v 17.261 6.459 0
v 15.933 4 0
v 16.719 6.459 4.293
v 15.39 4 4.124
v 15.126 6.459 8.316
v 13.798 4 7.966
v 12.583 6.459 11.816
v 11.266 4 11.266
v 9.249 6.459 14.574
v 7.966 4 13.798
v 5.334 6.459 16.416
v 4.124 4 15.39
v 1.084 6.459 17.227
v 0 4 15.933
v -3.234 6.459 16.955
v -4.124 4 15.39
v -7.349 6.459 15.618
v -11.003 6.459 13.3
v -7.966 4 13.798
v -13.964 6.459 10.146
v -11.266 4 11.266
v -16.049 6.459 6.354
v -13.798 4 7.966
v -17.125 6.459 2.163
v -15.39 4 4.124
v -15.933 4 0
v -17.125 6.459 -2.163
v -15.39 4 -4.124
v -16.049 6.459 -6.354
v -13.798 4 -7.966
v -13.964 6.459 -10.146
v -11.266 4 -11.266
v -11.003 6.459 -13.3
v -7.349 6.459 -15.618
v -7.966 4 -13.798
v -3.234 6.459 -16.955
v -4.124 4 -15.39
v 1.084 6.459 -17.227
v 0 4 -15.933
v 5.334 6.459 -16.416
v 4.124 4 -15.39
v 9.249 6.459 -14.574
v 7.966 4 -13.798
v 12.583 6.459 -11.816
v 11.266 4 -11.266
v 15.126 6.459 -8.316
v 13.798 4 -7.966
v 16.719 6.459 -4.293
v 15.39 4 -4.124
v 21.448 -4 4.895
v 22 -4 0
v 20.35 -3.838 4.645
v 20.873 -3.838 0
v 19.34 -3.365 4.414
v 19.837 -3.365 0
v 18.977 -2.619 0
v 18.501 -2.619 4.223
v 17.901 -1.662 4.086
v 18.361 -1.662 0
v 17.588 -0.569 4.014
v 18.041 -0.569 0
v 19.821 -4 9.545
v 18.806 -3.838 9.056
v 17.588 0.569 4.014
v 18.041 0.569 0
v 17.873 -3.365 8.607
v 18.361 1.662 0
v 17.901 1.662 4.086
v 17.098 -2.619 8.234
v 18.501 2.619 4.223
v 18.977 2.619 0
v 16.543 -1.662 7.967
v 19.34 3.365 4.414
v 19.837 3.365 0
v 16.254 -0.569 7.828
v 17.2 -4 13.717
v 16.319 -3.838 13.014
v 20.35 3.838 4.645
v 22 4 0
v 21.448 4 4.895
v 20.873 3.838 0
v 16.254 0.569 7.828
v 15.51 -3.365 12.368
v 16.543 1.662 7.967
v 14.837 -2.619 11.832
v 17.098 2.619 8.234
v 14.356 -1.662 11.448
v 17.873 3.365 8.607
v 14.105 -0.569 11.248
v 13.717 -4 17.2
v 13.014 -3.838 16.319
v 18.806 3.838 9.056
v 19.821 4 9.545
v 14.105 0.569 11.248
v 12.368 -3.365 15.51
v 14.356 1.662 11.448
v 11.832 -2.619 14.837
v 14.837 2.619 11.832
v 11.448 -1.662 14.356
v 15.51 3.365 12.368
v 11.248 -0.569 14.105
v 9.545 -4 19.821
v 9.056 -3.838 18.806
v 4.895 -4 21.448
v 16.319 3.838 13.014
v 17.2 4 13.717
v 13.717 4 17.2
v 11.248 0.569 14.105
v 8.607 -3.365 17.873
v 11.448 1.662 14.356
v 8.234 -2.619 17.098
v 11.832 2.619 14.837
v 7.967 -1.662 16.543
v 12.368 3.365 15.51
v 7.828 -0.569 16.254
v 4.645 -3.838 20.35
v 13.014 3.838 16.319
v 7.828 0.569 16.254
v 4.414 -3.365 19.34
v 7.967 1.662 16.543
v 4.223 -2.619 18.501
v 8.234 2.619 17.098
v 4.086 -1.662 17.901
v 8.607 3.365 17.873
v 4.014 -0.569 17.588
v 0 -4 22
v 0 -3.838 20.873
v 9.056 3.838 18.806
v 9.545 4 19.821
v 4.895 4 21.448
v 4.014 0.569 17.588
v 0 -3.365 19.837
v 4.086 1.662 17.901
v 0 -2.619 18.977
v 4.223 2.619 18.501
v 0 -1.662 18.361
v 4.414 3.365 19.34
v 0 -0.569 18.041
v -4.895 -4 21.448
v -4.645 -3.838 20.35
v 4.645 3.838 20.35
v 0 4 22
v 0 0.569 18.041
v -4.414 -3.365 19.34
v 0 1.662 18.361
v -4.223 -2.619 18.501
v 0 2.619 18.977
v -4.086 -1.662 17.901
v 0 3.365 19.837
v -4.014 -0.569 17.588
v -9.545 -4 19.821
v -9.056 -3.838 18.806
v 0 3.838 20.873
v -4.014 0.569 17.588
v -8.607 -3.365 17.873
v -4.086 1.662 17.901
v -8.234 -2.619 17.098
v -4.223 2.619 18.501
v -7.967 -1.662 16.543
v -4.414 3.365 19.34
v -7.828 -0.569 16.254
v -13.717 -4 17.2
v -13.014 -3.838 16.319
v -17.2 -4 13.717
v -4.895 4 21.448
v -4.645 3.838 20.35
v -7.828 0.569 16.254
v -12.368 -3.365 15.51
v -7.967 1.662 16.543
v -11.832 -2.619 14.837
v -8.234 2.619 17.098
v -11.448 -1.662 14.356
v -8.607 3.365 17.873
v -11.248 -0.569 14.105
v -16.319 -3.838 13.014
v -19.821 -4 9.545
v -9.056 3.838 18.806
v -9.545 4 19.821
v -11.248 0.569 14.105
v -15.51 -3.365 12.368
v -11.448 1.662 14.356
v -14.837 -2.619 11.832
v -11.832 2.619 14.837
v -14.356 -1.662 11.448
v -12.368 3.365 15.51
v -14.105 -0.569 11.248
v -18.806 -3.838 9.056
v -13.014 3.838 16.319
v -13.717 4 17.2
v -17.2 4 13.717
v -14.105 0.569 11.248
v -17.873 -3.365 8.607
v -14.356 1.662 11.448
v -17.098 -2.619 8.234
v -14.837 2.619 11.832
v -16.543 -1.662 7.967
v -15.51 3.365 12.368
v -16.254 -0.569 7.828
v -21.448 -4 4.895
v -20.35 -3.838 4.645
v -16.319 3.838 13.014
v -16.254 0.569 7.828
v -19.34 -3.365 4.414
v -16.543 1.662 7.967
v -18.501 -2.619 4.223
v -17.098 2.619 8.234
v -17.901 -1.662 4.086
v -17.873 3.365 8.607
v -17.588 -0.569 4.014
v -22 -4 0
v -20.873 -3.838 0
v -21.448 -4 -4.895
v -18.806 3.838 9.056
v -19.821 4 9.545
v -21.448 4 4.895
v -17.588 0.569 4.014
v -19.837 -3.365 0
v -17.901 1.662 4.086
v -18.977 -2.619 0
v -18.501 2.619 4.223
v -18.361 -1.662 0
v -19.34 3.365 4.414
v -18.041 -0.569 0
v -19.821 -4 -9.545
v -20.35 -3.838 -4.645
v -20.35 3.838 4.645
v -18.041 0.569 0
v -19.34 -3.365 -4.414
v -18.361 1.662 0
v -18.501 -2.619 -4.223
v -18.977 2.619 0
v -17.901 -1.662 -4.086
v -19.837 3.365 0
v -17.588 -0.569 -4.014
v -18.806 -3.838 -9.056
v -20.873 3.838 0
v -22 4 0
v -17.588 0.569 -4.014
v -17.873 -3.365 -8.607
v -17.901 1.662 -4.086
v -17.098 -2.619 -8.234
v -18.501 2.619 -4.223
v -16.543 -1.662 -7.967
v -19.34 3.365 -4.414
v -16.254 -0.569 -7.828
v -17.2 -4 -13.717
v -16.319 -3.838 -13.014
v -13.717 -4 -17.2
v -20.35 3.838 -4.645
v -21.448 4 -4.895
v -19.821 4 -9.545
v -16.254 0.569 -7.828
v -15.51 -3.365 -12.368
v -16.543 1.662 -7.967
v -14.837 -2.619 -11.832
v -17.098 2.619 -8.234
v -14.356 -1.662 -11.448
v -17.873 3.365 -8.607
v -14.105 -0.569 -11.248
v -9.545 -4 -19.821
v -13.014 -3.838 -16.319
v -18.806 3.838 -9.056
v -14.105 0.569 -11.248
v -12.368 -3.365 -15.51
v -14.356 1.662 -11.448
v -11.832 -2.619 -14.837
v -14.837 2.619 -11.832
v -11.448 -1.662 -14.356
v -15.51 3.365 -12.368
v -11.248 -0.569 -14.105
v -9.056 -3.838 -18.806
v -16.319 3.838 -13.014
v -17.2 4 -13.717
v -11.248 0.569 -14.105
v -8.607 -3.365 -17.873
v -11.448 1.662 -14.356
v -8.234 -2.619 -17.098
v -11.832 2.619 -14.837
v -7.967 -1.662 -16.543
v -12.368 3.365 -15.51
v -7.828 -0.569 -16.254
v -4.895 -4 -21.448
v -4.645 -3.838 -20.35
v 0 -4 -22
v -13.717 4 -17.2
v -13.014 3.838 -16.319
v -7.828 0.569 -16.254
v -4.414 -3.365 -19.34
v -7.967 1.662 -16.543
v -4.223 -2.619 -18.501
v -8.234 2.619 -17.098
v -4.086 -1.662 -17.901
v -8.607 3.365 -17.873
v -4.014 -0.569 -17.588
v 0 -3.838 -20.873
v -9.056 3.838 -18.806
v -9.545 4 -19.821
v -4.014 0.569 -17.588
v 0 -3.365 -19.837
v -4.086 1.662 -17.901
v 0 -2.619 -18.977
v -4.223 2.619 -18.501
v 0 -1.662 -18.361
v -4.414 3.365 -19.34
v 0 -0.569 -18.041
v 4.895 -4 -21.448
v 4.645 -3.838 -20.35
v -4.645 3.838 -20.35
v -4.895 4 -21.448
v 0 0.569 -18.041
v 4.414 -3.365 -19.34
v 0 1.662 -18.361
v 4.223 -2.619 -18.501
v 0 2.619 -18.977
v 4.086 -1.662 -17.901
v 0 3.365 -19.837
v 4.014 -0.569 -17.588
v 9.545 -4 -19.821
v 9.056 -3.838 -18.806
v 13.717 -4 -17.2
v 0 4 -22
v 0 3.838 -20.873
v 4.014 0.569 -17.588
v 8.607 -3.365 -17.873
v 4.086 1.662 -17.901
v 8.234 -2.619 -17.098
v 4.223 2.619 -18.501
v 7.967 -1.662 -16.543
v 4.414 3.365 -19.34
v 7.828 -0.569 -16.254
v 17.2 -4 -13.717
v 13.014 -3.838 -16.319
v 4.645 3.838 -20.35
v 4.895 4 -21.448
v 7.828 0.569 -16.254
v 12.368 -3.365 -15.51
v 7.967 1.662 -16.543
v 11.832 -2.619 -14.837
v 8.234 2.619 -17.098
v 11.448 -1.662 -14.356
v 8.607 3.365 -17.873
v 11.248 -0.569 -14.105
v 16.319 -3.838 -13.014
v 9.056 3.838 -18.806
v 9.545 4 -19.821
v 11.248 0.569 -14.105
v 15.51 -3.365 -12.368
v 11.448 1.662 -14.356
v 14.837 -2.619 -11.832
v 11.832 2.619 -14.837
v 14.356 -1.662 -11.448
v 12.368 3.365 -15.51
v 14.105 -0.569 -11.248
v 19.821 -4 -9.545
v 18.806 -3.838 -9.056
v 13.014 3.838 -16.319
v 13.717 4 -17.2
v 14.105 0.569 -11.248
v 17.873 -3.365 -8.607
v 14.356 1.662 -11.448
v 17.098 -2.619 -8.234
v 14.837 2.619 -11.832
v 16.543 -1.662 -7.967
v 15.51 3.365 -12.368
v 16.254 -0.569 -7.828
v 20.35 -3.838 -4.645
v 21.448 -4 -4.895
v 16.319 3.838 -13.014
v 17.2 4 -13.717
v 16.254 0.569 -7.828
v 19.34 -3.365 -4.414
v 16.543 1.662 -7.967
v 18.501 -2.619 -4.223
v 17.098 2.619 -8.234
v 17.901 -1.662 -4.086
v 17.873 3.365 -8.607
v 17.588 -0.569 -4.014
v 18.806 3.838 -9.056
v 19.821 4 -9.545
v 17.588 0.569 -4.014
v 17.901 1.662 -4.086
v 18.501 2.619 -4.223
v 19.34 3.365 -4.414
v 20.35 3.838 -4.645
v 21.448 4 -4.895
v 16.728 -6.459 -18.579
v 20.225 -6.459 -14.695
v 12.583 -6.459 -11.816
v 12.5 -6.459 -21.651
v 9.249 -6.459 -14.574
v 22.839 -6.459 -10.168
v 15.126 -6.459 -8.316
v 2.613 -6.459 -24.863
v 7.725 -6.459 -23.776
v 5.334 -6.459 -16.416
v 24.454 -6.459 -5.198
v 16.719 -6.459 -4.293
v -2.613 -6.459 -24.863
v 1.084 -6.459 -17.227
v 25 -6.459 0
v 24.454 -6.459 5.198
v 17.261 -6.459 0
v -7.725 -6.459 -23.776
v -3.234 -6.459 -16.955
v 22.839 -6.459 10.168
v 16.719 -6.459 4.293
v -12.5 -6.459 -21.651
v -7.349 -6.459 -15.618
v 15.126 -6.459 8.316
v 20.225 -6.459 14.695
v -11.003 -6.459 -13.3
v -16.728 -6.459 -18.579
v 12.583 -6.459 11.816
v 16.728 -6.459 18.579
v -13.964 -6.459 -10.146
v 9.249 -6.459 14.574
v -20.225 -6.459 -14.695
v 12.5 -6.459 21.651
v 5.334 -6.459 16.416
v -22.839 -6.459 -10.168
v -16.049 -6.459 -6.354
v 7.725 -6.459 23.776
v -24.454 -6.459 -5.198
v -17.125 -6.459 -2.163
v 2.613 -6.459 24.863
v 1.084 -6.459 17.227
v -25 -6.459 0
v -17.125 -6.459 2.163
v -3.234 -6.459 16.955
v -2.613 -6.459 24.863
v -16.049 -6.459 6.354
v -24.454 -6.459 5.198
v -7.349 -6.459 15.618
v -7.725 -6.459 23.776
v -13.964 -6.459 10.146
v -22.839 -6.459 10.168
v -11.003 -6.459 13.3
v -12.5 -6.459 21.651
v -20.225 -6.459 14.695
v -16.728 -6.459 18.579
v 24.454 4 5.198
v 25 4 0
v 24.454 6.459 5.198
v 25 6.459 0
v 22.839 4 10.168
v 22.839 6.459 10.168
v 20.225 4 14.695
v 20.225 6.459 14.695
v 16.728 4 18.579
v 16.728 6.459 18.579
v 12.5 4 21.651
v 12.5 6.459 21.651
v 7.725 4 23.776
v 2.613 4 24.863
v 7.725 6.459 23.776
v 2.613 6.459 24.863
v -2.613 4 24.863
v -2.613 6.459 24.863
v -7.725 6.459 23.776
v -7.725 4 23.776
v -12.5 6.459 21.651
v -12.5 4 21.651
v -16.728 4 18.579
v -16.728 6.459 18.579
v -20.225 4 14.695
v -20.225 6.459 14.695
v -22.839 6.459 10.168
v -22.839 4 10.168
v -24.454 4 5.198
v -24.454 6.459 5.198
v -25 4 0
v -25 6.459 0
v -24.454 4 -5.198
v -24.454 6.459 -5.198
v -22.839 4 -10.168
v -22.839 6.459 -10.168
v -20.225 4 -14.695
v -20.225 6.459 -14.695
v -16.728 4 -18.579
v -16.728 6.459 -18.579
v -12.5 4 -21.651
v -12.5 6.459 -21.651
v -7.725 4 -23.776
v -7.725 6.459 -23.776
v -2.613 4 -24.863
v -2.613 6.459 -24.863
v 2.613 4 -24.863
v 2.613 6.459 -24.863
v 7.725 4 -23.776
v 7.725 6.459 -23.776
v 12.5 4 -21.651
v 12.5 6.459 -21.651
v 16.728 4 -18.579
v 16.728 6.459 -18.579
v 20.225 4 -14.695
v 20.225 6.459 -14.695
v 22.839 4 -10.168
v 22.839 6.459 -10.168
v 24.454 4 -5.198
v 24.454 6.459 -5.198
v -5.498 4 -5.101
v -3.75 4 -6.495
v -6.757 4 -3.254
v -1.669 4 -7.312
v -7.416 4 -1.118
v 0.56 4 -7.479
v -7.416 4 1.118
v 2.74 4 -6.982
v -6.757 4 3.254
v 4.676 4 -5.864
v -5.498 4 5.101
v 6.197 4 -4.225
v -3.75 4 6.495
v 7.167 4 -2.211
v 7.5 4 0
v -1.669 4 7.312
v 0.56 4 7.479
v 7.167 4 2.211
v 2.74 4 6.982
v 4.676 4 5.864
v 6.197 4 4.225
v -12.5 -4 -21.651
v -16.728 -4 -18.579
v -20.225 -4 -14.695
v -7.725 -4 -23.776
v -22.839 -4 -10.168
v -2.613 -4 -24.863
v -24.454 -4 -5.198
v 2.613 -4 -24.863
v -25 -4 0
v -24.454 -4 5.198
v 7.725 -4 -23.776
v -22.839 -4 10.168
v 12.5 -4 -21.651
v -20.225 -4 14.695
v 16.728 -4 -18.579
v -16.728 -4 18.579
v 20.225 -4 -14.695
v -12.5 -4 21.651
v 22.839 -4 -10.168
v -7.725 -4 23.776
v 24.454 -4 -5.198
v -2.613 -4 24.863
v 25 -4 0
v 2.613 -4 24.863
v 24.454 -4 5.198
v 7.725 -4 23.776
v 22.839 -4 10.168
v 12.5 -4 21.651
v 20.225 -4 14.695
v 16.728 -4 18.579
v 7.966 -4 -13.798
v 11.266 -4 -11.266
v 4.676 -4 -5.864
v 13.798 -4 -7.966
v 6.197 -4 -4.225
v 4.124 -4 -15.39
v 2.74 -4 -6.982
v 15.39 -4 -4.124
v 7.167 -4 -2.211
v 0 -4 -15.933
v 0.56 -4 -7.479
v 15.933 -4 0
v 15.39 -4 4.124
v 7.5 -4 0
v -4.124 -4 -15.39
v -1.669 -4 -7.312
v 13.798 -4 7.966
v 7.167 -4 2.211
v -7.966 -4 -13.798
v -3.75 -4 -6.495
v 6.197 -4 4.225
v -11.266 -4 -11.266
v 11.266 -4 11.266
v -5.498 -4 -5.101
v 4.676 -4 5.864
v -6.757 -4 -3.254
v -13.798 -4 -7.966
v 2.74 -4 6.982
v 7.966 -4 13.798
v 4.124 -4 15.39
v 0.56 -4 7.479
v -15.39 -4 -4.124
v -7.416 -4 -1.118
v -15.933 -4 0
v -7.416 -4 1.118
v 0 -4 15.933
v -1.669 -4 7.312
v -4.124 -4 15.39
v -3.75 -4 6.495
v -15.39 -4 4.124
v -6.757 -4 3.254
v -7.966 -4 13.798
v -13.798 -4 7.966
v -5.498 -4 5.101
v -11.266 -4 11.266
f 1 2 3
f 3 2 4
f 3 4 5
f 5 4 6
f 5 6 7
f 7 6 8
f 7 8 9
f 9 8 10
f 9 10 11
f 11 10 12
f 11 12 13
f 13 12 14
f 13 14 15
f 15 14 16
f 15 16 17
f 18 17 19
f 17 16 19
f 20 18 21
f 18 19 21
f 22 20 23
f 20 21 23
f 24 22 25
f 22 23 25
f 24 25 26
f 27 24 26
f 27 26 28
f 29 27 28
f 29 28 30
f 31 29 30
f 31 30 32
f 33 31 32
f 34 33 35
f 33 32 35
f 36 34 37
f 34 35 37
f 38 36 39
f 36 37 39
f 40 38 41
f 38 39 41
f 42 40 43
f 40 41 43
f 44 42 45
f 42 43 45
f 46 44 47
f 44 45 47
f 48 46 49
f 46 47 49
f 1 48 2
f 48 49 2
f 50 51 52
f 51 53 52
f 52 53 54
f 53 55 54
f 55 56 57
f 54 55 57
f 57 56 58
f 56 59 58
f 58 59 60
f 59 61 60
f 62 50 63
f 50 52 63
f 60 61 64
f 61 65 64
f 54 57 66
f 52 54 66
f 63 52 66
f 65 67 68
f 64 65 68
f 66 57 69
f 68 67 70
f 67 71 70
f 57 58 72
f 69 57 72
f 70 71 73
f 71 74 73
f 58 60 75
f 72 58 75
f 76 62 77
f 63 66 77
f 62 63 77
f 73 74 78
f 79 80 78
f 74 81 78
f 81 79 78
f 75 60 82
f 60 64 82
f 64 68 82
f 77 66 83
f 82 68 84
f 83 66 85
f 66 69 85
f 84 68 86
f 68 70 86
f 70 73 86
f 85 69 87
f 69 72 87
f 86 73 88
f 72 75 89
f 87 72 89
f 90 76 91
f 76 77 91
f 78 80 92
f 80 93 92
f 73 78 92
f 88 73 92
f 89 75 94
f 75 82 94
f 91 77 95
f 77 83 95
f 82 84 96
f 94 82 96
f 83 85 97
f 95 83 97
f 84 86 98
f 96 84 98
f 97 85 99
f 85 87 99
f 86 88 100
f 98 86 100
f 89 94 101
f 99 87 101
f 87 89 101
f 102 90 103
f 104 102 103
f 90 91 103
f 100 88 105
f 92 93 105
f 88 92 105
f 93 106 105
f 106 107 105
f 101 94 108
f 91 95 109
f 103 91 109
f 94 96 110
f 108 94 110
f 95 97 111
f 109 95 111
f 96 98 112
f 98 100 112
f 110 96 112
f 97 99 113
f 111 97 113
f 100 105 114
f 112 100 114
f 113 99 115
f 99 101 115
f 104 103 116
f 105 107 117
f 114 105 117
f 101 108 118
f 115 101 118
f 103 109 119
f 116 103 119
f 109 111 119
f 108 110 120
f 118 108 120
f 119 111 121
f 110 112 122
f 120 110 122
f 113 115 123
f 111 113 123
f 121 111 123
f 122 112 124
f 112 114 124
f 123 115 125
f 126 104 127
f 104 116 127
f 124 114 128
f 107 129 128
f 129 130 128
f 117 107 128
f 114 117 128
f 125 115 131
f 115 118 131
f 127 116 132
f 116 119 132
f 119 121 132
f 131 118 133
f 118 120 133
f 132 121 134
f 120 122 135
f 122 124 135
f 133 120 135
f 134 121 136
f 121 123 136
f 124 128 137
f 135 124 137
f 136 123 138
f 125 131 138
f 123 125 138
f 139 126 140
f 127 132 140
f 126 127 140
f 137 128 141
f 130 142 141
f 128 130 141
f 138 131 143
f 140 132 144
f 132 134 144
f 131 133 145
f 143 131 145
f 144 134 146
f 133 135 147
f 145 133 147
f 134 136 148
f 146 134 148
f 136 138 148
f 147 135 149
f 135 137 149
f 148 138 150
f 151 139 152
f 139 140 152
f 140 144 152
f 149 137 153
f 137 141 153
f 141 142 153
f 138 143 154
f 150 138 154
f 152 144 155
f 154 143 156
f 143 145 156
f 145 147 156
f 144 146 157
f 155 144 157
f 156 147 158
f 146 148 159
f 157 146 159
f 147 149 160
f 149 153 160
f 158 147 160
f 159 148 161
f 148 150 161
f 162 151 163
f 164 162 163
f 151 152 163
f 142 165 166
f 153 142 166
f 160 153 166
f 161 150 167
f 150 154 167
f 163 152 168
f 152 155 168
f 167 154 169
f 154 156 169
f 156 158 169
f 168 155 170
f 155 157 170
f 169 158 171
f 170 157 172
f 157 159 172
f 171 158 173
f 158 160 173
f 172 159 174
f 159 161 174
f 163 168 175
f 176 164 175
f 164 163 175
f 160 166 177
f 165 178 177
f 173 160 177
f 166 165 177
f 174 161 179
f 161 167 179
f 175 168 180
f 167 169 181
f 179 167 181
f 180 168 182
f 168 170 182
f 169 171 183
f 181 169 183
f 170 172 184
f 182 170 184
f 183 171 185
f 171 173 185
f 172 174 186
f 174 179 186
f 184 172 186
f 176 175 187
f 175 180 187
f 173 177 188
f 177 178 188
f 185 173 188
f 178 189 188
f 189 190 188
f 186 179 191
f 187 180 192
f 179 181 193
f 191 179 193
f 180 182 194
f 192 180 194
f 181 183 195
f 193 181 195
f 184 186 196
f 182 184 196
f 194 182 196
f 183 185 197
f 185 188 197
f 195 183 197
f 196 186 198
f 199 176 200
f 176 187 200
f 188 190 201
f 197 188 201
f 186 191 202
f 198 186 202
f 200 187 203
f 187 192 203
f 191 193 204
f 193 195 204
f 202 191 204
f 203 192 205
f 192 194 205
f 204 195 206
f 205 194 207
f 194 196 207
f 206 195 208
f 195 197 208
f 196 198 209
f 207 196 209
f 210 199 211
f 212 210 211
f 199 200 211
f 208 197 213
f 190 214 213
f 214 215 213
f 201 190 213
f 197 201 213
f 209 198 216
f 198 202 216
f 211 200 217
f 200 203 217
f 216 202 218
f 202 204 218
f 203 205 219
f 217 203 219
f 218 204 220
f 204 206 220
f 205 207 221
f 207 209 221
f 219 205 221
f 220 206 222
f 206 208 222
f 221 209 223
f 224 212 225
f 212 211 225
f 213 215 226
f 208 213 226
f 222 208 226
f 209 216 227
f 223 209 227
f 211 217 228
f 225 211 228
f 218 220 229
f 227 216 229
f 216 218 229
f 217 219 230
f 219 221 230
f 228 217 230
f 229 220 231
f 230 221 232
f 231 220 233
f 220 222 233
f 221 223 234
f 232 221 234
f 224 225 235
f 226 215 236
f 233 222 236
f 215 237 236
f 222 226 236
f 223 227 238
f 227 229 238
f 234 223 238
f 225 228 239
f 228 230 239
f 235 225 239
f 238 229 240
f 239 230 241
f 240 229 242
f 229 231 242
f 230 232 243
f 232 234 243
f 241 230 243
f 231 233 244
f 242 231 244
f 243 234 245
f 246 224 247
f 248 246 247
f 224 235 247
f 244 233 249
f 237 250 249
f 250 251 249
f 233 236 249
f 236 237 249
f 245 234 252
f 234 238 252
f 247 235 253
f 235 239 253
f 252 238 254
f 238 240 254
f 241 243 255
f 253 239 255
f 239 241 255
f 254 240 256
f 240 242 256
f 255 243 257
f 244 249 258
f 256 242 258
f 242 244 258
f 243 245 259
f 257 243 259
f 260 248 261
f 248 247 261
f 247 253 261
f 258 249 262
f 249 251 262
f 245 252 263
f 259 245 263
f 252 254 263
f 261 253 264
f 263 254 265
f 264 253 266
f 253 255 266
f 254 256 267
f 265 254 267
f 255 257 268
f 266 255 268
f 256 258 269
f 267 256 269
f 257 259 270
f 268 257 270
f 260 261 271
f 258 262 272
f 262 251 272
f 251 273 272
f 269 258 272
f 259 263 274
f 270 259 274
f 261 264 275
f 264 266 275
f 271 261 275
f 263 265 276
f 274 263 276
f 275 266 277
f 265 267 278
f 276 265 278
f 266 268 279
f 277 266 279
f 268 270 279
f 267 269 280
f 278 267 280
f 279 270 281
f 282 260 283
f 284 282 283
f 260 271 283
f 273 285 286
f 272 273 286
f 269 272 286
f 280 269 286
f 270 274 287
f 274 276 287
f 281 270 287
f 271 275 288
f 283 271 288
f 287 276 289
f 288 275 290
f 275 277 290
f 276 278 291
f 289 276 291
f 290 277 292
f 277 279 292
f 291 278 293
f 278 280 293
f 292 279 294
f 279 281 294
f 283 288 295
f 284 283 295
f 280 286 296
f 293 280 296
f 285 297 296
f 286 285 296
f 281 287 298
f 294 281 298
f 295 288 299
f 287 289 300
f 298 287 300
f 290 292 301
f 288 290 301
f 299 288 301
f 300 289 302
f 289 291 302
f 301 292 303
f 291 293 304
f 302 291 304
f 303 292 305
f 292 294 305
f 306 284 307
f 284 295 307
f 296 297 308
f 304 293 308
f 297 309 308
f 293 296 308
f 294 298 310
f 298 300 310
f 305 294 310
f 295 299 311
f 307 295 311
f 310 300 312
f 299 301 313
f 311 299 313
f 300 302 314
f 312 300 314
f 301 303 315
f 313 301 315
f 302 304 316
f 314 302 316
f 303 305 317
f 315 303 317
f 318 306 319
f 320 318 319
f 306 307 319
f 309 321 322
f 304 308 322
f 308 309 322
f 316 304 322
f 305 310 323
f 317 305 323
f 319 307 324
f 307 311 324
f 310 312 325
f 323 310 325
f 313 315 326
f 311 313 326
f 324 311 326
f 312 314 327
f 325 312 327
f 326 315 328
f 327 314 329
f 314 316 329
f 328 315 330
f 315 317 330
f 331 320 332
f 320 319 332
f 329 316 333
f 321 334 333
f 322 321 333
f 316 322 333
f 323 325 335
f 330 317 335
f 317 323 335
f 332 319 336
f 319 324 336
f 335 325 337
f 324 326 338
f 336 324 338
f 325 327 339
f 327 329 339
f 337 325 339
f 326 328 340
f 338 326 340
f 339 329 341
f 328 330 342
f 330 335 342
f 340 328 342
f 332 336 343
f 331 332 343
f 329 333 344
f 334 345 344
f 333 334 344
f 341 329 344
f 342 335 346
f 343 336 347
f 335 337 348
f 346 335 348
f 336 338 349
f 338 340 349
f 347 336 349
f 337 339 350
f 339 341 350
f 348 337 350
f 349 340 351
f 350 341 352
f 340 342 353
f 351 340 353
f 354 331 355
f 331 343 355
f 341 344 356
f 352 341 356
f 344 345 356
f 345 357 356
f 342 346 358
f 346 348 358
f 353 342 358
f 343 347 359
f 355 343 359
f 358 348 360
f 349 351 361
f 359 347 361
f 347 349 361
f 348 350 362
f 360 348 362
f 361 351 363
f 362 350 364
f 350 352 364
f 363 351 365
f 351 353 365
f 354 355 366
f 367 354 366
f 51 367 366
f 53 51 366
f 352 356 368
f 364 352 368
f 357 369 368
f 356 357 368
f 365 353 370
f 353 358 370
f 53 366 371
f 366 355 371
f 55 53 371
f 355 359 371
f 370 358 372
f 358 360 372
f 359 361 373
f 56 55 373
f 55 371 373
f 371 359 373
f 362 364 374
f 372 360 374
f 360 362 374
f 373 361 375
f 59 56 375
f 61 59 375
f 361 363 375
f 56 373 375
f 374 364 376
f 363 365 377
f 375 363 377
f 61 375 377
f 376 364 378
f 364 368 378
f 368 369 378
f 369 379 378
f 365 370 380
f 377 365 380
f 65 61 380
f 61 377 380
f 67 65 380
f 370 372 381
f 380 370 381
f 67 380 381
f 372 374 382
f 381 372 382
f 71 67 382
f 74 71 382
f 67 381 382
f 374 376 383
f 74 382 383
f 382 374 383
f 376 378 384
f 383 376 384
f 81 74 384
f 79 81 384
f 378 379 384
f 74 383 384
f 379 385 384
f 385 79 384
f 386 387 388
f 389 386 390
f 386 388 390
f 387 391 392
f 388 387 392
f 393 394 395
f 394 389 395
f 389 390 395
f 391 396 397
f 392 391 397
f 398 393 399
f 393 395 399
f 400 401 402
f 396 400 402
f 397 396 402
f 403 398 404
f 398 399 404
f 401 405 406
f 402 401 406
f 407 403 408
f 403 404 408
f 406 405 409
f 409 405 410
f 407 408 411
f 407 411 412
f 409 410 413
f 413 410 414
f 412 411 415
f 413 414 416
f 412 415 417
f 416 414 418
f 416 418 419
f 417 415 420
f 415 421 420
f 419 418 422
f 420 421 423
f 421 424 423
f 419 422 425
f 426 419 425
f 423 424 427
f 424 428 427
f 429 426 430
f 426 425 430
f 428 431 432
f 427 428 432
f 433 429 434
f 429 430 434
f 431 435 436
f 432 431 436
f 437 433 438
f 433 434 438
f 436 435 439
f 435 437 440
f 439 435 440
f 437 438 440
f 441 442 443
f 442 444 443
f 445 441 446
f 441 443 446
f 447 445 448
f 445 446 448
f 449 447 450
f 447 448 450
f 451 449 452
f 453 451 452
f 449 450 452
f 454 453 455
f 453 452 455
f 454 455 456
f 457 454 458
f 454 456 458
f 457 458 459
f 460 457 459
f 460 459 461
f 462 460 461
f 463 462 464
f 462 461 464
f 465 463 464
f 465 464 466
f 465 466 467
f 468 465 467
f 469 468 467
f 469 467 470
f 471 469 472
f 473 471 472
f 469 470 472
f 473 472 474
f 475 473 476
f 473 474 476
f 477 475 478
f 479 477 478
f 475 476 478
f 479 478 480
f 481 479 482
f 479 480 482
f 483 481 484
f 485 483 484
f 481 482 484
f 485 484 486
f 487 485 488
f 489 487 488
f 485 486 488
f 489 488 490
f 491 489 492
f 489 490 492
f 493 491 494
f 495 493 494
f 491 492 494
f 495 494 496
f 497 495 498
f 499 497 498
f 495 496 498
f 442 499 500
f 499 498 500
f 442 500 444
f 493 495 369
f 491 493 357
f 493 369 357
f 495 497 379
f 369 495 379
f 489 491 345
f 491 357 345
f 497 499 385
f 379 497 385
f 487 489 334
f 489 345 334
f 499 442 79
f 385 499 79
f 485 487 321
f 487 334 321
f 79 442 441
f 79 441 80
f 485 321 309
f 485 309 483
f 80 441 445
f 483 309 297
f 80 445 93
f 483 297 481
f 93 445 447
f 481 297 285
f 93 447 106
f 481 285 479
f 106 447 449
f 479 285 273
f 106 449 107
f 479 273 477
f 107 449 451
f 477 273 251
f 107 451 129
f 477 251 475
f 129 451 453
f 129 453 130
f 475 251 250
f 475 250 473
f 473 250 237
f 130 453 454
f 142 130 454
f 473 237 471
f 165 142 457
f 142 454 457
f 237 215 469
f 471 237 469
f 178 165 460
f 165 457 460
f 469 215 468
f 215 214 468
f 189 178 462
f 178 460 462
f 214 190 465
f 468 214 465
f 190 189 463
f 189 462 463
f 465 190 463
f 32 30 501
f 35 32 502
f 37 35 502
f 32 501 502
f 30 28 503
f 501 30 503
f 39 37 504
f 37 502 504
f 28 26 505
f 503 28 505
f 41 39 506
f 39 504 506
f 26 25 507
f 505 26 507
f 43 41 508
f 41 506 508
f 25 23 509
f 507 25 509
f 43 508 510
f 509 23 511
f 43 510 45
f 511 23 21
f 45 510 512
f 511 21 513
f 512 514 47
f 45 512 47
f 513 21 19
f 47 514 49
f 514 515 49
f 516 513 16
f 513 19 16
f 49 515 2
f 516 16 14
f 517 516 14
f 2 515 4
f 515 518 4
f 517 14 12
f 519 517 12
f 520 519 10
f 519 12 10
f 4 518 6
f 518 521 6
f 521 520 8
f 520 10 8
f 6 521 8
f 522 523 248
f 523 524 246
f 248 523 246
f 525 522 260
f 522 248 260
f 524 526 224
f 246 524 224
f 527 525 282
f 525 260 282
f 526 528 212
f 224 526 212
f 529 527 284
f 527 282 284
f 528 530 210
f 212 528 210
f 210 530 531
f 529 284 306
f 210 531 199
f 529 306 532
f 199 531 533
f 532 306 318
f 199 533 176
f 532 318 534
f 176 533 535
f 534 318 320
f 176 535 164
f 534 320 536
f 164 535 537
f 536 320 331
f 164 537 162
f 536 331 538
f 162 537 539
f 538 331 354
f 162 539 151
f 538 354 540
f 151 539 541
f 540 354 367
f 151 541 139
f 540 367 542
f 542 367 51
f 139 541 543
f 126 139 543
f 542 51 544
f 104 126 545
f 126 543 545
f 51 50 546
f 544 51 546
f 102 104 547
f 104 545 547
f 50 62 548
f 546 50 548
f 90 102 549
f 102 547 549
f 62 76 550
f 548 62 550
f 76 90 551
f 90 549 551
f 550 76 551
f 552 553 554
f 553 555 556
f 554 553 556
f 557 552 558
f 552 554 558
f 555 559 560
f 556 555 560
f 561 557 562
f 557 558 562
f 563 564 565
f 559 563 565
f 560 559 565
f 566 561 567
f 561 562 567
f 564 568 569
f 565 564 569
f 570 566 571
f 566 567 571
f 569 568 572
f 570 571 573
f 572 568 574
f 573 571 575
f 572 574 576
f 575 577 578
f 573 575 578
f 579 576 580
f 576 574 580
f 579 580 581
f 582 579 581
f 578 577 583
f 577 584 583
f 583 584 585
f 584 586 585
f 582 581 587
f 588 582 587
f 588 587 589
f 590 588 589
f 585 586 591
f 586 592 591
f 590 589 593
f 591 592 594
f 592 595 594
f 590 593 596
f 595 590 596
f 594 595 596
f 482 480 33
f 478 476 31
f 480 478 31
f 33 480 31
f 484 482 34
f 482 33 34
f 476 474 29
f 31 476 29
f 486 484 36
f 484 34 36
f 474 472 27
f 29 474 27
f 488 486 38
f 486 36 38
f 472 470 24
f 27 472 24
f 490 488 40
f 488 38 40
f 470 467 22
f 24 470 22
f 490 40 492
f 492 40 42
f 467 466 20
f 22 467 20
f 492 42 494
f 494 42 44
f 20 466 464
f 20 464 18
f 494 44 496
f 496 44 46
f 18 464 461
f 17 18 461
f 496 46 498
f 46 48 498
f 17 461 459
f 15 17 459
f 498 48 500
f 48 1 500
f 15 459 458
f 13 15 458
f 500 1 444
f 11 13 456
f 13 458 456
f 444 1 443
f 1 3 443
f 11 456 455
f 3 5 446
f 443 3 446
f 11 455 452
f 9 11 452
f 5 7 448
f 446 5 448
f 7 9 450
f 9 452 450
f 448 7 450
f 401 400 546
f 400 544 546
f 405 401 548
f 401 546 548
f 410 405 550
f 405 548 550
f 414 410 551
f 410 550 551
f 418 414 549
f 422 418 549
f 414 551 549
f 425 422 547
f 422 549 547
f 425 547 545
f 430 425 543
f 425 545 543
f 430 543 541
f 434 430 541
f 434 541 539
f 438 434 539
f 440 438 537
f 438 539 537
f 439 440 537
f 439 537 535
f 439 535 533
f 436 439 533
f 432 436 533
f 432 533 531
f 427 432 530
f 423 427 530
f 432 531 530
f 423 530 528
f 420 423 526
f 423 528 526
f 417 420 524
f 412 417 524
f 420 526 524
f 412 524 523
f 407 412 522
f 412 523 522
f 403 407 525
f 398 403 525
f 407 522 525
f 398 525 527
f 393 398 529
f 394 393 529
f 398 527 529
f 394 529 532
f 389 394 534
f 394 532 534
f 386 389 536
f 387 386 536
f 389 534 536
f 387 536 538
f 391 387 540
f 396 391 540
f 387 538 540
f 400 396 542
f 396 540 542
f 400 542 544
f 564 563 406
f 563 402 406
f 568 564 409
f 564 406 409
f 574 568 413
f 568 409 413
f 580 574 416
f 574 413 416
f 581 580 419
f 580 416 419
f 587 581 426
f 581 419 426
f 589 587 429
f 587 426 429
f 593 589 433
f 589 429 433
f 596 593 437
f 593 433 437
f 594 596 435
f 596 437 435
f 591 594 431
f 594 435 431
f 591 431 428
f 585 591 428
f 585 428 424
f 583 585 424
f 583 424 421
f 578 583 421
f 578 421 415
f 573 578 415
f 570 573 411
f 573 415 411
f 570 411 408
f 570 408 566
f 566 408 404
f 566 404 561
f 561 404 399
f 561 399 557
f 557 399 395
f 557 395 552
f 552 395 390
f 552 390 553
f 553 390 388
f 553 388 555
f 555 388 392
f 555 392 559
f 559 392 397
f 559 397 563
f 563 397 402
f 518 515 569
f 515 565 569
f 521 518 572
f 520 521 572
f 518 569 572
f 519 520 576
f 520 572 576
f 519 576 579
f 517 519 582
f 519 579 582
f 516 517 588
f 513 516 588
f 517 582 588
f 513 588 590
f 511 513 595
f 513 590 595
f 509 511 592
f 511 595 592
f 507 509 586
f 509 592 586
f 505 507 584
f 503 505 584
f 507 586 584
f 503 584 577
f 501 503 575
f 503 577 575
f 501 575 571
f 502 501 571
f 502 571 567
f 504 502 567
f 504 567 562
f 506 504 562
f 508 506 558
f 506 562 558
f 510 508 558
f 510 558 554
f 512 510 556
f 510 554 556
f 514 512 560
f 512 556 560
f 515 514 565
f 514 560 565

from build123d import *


with BuildPart() as part:
    # Эскиз1 → Повернуть1 (revolve)
    with BuildSketch(Plane.XY):
        with BuildLine():
            Line((7.5, 4), (7.5, -4))
            Line((7.5, -4), (15.93289357, -4))
            Line((15.93289357, -4), (17.26104157, -6.459147259))
            Line((17.26104157, -6.459147259), (25, -6.459147259))
            Line((25, -6.459147259), (25, -4))
            Line((25, -4), (22, -4))
            ThreePointArc((22, -4), (18, 0), (22, 4))
            Line((22, 4), (25, 4))
            Line((25, 4), (25, 6.459147259))
            Line((25, 6.459147259), (17.26104157, 6.459147259))
            Line((17.26104157, 6.459147259), (15.93289357, 4))
            Line((15.93289357, 4), (7.5, 4))
        make_face()
    revolve(axis=Axis((0, 40.932480583, 0), (0, -1, 0)))


solid = part.part
